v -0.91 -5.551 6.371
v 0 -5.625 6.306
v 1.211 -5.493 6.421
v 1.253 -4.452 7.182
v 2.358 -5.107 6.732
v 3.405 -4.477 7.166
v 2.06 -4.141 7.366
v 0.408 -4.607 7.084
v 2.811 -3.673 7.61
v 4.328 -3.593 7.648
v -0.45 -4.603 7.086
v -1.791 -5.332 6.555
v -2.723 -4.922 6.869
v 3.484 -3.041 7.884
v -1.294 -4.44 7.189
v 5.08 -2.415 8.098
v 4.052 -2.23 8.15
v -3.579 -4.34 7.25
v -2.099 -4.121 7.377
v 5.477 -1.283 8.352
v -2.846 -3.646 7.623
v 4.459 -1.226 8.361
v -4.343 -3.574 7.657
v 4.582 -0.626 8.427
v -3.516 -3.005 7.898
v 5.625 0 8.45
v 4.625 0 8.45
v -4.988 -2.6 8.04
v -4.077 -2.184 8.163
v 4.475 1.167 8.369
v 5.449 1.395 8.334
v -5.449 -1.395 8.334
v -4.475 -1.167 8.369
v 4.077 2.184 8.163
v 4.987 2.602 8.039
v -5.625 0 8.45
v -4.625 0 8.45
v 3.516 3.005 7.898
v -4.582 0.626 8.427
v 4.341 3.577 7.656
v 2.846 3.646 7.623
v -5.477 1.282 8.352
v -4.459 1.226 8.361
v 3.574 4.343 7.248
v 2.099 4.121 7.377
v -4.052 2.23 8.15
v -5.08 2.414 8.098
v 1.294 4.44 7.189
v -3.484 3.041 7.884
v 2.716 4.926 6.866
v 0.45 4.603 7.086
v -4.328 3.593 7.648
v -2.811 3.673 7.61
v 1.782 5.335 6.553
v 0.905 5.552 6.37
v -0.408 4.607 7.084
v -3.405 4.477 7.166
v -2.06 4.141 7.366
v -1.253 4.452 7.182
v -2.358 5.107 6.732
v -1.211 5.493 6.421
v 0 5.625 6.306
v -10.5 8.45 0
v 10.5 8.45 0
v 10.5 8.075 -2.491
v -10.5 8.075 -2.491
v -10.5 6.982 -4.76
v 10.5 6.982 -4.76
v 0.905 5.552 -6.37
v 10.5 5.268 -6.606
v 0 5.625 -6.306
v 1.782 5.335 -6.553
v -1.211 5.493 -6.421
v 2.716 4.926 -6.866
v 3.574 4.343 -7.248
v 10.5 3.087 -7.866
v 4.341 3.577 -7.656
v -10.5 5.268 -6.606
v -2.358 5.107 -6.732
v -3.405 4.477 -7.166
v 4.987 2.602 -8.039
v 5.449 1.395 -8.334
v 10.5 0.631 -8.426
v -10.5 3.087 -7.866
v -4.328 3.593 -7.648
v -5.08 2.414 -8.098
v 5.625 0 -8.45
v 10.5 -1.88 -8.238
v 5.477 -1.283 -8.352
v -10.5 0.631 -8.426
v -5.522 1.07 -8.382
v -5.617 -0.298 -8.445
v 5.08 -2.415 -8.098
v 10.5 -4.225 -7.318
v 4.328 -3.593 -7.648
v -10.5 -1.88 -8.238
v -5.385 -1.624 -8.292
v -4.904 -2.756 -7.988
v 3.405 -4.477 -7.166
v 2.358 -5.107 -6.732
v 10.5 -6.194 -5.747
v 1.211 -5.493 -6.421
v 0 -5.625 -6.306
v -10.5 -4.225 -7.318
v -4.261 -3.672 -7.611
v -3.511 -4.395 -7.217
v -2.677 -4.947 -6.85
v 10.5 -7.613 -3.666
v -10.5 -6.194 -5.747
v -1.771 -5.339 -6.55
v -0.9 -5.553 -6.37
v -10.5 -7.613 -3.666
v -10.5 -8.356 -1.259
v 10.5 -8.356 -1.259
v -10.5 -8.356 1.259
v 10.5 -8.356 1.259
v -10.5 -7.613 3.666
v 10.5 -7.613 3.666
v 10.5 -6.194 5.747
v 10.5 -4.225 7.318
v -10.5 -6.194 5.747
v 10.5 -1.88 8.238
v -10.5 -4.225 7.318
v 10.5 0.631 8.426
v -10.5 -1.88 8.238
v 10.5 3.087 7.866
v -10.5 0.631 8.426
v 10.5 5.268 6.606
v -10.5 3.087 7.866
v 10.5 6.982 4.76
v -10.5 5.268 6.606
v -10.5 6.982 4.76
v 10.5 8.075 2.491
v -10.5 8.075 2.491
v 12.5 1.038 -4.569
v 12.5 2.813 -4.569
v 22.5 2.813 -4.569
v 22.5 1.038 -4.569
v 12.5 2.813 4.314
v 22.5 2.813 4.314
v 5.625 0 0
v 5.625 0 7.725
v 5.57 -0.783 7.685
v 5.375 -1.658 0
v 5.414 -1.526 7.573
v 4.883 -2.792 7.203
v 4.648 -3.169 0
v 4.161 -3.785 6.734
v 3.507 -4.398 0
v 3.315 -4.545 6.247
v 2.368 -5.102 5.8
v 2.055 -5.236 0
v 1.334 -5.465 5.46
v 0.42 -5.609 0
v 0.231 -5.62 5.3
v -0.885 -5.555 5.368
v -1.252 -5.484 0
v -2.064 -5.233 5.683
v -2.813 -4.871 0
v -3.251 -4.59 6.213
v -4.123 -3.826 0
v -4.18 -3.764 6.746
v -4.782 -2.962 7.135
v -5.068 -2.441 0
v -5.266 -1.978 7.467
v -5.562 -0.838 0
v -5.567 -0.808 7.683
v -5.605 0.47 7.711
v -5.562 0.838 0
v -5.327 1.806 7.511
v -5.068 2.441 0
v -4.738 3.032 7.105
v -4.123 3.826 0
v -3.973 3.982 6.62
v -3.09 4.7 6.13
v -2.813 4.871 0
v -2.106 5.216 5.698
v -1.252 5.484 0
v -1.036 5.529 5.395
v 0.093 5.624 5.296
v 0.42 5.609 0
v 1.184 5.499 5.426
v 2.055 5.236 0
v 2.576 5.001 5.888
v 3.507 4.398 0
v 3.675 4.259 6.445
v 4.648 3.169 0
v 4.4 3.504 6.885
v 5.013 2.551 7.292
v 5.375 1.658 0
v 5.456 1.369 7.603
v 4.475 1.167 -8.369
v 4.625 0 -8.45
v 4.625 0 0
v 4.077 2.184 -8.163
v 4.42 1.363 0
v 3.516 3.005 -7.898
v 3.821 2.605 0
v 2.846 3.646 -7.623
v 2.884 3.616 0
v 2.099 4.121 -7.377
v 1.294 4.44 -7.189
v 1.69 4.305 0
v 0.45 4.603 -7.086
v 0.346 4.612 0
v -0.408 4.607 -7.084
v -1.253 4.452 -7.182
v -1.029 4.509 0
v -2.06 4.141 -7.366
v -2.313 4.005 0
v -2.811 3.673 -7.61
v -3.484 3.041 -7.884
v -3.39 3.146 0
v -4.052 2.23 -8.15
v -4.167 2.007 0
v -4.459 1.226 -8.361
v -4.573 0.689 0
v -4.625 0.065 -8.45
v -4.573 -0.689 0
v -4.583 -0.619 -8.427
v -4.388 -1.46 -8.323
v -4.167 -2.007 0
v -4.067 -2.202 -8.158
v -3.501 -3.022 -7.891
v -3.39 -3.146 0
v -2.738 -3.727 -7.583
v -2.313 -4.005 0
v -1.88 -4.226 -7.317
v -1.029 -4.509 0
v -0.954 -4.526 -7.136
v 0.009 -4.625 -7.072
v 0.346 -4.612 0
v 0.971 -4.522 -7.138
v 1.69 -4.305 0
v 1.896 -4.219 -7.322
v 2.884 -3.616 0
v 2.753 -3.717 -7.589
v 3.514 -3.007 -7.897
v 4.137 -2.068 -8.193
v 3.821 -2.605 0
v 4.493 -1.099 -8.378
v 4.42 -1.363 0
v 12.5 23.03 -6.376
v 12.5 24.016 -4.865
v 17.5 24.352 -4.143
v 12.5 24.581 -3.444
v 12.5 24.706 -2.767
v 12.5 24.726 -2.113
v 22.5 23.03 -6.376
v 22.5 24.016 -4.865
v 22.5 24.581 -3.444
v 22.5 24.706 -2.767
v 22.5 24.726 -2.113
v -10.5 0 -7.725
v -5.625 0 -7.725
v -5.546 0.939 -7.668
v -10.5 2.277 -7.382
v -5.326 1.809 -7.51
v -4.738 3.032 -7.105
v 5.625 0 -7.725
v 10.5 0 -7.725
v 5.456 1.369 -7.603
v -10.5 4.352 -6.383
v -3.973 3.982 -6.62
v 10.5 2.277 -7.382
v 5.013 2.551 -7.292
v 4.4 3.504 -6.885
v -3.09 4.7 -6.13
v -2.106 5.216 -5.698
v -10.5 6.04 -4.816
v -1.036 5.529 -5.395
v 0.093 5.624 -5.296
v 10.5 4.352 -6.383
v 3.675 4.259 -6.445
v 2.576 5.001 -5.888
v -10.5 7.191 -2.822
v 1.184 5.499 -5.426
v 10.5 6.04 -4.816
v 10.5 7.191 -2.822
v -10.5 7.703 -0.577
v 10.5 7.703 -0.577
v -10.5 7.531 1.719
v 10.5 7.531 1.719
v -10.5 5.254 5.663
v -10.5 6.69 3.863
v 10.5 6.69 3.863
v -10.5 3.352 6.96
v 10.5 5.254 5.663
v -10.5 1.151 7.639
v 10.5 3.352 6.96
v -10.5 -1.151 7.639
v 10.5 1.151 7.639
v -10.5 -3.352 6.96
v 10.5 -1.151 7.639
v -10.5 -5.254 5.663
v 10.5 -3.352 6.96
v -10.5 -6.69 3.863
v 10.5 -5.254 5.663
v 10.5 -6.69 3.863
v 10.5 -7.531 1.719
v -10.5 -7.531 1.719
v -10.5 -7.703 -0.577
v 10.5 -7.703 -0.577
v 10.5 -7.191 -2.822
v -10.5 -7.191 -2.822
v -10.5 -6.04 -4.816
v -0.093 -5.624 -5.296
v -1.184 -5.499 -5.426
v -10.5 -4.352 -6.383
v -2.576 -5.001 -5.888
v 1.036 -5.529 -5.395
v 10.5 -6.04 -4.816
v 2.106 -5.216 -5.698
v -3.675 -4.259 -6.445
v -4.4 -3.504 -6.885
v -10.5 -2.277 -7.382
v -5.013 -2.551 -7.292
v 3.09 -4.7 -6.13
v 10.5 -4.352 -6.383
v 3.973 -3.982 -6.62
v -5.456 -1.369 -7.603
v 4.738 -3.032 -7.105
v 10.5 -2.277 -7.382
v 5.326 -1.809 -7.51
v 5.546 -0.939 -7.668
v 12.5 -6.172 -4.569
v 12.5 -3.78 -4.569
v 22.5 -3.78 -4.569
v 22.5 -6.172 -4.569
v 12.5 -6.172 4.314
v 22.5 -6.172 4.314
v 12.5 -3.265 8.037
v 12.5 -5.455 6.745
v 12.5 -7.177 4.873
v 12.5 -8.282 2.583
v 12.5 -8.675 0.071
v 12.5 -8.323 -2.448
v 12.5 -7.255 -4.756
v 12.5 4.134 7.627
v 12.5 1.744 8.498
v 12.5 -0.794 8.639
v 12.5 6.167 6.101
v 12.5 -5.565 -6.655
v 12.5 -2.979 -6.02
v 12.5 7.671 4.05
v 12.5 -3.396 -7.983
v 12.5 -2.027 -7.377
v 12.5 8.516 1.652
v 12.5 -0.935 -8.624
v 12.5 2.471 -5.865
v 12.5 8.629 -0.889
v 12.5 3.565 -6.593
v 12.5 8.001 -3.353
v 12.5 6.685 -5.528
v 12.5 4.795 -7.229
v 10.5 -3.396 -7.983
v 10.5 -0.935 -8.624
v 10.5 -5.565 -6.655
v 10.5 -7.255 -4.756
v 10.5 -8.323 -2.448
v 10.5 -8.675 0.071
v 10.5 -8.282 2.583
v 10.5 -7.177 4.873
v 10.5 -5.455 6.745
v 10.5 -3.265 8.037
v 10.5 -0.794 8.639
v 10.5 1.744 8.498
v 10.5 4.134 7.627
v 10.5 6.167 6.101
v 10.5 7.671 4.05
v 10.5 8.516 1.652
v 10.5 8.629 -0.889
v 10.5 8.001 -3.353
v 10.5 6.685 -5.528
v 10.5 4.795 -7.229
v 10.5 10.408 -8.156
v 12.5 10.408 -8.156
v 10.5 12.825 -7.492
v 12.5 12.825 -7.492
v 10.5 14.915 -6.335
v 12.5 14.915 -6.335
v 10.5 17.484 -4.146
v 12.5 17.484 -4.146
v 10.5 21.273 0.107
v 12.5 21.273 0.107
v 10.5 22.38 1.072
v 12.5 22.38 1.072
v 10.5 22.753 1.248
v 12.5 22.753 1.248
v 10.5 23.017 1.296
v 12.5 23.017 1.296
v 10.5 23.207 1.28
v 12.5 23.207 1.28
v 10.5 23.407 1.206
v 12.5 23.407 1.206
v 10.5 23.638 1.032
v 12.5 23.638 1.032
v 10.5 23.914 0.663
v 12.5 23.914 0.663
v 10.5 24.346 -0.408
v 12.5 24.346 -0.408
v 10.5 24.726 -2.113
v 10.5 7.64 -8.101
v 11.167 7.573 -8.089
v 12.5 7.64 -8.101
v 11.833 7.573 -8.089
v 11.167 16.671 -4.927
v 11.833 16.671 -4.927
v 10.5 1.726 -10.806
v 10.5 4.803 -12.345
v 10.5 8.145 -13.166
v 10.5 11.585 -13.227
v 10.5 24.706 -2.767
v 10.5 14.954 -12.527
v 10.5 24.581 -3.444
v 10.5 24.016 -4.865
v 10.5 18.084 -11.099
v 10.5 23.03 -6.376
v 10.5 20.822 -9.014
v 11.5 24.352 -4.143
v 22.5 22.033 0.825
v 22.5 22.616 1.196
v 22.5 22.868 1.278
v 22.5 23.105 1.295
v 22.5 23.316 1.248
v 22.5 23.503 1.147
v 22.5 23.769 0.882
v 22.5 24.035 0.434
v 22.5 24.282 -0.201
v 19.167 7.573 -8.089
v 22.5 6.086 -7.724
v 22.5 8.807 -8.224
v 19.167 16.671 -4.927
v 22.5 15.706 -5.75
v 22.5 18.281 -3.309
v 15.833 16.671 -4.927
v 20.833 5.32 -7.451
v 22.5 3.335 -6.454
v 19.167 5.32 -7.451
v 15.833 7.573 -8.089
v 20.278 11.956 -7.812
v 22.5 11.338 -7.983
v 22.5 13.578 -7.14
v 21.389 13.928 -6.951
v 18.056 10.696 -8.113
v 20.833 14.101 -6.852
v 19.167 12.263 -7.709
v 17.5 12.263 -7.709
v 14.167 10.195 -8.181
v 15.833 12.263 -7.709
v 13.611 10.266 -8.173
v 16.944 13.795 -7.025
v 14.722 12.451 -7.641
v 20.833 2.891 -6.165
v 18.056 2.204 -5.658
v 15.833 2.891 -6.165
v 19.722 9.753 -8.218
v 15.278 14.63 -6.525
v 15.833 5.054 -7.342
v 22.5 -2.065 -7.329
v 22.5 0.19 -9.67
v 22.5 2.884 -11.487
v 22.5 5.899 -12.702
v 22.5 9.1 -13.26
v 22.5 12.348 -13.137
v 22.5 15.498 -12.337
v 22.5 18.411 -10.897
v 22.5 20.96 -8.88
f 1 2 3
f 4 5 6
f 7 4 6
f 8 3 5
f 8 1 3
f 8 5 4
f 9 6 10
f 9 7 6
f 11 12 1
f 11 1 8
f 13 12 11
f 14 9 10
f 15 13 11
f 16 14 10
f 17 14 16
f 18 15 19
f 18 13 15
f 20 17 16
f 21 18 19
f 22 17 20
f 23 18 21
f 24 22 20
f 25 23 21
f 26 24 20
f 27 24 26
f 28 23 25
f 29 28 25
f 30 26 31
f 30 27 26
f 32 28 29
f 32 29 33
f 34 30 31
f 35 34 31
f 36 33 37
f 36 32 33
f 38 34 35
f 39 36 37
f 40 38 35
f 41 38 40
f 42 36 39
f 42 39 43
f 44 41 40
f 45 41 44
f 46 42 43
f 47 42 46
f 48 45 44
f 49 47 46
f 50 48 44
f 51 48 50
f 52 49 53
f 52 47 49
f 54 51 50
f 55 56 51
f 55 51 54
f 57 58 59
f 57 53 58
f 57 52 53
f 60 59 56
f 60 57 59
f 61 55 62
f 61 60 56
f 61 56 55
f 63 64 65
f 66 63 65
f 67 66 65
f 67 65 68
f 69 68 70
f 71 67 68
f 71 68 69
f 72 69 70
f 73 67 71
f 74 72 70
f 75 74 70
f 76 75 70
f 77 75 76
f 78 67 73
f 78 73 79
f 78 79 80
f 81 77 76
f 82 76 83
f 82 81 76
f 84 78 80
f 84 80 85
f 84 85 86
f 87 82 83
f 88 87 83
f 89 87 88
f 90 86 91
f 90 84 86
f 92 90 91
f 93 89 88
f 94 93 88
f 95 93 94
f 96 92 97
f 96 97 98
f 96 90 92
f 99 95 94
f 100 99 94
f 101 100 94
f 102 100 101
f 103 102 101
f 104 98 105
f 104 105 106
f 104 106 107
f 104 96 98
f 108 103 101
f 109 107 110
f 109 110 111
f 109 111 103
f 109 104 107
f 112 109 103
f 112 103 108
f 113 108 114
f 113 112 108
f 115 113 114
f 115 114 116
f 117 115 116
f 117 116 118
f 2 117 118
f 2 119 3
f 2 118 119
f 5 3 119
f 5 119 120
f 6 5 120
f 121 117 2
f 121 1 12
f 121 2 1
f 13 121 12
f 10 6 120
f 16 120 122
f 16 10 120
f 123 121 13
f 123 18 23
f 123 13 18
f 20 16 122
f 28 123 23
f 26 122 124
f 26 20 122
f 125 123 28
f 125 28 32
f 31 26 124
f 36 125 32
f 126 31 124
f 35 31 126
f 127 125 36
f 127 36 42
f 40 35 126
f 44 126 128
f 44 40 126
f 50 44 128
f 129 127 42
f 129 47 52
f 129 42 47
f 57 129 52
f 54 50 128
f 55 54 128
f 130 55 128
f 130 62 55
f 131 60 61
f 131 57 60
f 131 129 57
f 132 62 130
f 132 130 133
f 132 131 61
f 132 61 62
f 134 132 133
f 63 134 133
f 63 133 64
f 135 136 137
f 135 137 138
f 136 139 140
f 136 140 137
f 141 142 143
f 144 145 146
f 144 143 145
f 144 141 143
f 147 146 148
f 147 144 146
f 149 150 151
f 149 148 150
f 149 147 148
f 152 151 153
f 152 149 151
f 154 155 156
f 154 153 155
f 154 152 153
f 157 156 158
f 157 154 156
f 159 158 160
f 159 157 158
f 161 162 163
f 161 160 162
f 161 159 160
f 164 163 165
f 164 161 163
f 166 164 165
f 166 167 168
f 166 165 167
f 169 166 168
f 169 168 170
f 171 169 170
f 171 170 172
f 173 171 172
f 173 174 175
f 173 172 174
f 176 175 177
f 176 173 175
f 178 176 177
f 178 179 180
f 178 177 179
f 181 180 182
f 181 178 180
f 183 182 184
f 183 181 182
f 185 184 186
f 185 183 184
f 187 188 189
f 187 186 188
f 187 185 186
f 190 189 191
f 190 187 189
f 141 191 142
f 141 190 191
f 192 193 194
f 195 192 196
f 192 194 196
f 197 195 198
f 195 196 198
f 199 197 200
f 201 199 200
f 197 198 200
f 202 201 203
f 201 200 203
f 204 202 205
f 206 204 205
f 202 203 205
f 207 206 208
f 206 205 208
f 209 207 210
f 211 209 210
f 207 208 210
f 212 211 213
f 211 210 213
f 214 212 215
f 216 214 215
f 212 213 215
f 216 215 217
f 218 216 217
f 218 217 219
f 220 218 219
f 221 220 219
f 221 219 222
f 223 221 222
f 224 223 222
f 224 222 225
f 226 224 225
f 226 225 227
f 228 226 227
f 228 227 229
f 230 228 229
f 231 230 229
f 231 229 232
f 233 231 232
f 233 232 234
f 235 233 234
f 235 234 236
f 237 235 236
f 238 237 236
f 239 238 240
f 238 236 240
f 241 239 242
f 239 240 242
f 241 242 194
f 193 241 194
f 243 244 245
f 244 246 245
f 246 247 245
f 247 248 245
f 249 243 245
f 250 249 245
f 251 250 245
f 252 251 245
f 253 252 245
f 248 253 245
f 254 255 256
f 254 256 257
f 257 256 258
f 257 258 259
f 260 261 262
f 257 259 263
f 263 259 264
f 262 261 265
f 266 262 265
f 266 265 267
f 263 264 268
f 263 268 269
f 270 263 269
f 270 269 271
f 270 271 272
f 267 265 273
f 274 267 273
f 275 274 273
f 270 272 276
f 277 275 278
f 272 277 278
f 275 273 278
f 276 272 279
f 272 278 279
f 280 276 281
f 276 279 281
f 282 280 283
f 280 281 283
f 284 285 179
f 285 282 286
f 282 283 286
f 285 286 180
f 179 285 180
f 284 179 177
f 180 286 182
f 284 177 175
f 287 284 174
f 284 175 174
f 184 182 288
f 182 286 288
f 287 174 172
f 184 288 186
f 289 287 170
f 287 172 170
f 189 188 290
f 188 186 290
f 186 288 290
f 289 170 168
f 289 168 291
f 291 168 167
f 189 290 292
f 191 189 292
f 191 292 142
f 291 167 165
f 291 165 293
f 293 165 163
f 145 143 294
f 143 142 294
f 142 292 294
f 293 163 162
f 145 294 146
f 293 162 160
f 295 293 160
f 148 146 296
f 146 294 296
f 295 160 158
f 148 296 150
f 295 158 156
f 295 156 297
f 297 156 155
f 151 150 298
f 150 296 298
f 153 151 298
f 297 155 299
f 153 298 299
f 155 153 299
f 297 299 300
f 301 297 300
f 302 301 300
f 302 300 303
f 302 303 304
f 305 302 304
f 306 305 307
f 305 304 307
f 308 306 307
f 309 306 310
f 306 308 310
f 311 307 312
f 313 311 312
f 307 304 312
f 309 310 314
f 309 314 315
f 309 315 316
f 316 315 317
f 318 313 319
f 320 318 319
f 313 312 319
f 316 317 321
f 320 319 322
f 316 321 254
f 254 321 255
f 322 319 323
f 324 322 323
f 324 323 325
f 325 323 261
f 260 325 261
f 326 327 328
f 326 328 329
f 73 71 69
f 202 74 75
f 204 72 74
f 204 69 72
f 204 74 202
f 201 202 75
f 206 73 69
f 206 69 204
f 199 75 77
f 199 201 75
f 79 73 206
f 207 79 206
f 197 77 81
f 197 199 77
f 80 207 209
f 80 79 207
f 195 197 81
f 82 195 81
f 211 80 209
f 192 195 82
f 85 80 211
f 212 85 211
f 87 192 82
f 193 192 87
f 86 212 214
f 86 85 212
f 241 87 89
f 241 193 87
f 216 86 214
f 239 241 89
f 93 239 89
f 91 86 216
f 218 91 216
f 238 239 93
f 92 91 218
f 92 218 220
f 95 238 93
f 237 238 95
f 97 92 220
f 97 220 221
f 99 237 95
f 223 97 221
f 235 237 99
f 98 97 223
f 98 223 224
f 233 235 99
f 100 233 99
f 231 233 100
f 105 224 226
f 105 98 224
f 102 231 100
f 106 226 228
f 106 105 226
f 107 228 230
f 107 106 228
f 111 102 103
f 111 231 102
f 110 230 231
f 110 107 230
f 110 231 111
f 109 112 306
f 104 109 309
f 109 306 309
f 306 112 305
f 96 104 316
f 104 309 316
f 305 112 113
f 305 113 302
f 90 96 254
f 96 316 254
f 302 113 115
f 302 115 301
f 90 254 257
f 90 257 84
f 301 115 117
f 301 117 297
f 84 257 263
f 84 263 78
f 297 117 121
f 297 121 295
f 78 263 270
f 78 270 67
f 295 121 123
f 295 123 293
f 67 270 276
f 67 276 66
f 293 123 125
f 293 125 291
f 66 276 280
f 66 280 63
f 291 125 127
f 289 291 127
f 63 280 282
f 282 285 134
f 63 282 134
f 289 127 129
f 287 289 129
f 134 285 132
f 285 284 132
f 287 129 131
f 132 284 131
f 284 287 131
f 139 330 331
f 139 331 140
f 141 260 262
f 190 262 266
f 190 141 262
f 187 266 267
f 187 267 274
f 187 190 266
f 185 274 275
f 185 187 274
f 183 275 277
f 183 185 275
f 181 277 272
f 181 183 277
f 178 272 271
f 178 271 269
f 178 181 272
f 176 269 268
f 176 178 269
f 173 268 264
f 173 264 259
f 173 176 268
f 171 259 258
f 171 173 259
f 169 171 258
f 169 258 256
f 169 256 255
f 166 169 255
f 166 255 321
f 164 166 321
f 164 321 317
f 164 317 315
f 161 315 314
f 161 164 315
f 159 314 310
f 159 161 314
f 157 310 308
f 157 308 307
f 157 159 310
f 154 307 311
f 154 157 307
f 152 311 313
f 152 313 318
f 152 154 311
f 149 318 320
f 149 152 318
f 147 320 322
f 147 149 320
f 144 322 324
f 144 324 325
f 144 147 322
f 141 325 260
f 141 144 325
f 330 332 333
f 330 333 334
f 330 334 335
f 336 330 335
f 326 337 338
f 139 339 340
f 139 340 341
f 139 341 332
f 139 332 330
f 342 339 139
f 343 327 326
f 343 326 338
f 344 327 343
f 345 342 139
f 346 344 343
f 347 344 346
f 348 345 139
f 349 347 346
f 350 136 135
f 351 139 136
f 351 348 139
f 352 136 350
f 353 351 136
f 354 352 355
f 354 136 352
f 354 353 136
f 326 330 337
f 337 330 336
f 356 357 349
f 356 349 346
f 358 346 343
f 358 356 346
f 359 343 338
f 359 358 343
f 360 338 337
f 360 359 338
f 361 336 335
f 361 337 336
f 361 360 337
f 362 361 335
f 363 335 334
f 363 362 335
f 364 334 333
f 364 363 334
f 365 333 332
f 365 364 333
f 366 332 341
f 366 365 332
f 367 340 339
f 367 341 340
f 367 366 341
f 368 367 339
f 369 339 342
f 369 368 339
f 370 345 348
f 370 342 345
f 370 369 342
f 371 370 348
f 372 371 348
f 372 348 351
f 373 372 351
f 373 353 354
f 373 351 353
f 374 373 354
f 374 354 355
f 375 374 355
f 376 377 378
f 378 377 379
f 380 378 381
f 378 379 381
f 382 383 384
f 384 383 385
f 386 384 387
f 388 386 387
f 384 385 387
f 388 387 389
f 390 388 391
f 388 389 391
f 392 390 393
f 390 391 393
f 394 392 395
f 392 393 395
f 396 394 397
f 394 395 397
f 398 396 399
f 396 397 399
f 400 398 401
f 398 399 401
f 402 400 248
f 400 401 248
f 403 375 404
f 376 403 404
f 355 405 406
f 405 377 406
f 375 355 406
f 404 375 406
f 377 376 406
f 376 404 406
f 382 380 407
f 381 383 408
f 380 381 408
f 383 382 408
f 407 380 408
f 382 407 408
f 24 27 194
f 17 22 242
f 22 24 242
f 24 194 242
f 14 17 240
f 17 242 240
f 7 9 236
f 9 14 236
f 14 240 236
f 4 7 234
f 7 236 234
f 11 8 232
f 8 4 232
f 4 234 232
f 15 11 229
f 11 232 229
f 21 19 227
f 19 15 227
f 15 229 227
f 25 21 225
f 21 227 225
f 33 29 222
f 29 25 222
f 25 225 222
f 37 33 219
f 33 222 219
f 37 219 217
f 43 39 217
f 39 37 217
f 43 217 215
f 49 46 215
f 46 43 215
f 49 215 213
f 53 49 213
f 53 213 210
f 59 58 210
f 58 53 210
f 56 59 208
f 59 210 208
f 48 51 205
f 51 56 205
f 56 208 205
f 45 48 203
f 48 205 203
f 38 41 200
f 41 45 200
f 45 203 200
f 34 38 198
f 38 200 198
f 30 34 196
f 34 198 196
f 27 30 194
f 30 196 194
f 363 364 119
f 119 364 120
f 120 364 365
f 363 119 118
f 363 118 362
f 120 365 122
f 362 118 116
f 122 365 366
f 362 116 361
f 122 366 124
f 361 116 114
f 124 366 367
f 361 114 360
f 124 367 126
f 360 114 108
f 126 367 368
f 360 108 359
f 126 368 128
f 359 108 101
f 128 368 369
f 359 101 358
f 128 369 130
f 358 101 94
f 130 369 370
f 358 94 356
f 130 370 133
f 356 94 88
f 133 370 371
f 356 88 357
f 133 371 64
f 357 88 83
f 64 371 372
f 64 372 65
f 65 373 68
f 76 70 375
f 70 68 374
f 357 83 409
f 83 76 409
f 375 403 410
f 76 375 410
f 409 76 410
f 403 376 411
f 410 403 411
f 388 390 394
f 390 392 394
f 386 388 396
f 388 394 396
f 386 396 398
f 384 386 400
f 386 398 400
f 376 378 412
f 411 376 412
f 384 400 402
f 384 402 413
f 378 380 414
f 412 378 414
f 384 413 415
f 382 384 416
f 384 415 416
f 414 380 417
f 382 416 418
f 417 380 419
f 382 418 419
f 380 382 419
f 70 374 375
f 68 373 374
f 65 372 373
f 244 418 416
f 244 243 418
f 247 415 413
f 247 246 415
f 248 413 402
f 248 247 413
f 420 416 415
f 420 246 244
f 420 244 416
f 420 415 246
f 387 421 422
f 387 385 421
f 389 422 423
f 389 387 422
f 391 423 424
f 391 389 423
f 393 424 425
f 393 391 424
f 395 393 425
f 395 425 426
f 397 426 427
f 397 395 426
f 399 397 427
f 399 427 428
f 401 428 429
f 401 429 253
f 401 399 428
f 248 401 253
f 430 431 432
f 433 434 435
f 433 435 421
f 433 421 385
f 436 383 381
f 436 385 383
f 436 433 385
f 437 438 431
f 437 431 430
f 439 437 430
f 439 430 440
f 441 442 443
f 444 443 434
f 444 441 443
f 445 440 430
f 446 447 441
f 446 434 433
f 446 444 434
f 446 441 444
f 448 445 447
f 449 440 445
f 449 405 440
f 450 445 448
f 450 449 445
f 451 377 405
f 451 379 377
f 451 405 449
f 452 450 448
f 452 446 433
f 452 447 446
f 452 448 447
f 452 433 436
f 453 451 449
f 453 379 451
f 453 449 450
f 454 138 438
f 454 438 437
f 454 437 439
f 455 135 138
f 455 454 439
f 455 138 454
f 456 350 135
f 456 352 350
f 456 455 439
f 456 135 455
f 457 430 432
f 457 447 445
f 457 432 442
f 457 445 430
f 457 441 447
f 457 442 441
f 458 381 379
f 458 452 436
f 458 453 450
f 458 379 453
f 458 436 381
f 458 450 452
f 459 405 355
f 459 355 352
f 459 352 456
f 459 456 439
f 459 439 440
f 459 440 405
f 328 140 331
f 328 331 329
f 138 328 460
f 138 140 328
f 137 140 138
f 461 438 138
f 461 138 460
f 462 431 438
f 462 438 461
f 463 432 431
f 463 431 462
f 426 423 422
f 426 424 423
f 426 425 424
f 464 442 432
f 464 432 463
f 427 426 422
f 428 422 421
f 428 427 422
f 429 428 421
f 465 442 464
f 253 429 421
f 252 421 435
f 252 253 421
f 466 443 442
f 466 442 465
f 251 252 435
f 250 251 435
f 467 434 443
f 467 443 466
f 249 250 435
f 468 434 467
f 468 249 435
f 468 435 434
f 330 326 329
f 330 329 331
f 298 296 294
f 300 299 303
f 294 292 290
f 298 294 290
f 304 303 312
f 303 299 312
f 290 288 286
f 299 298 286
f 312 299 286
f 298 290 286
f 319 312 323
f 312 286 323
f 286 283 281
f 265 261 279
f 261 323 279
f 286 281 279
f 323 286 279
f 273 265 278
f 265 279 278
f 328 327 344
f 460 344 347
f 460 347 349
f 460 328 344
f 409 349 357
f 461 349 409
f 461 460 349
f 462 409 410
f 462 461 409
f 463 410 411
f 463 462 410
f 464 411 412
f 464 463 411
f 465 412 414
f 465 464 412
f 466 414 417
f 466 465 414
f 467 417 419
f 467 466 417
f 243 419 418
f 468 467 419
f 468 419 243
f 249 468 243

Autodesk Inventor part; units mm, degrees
ref_plane "YZ Plane" through (0, 0, 0) normal (1, 0, 0) x (0, 1, 0)
ref_plane "XZ Plane" through (0, 0, 0) normal (0, 1, 0) x (-1, 0, 0)
ref_plane "XY Plane" through (0, 0, 0) normal (0, 0, 1) x (1, 0, 0)
sketch "Sketch1" plane through (0, 0, 0) normal (1, 0, 0) x (0, 1, 0)
  circle A0 centre (0, 0) radius 8.45
  dimension "d0" = 16.9
extrude "Extrusion1" add sketch "Sketch1" along normal mid plane 21
sketch "Sketch2" plane through (10.5, 0, 0) normal (1, 0, 0) x (0, 0, -1)
  circle A0 centre (0, 0) radius 7.725
  circle A1 centre (0, 0) radius 9.725
  dimension "d3" = 2
  dimension "d4" = 19.45
extrude "Extrusion2" cut sketch "Sketch2" against normal blind 21.5 contours A0
sketch "Sketch3" plane through (0, 0, 0) normal (0, 0, 1) x (1, 0, 0)
  circle A0 centre (0, 0) radius 5.625
  dimension "d7" = 11.25
extrude "Extrusion3" add sketch "Sketch3" along normal mid plane 18
sketch "Sketch4" plane through (0, 0, 0) normal (0, 0, 1) x (1, 0, 0)
  circle A0 centre (0, 0) radius 4.625
  dimension "d10" = 9.25
extrude "Extrusion5" cut sketch "Sketch4" along normal mid plane 100
sketch "Sketch5" plane through (10.5, 0, 0) normal (1, 0, 0) x (0, 0, -1)
  circle A0 centre (0, 0) radius 8.675
  dimension "d15" = 17.35
extrude "Extrusion6" add sketch "Sketch5" along normal blind 2
sketch "Sketch6" plane through (12.5, 0, 0) normal (1, 0, 0) x (0, 0, -1)
  arc A0 (1.0628, -4.9847) -> (6.3756, 23.0304) centre (-2.1717, 10.14) ccw
  spline S0 degree 4 poles (1.0628, -0.783) (3.325, -0.3237) (6.6509, 1.9196) (12.5543, 12.8577) (0.0955, 21.0445) (-3.8878, 23.6903) (2.1134, 24.7257) knots 0 0 0 0 0 0.38125 0.63125 1 1 1 1 1
  line L0 (-1.8785, -1.3802) -> (4.0041, -0.1858) construction
  arc A1 (-1.2523, -0.8951) -> (3.2382, 0.0167) centre (-0.4606, 6.7196) ccw construction
  spline S1 degree 2 poles (6.3756, 23.0304) (3.3857, 25.3291) (1.0628, 24.5204) knots 0 0 0 1 1 1
  line L1 (-6.8176, 23.1848) -> (11.0445, 26.2665) construction
  arc A2 (9.1477, 24.9445) -> (-4.5875, 22.5748) centre (6.4085, -0.169) ccw construction
  line L2 (-4.3138, 2.8134) -> (4.5692, 2.8134)
  line L3 (4.5692, -6.1723) -> (-4.3138, -6.1723)
  line L4 (-4.3138, -6.1723) -> (-4.3138, 2.8134)
  line L5 (4.5692, 2.8134) -> (4.5692, 1.038)
  line L6 (4.5692, -3.7804) -> (4.5692, -6.1723)
  point P0 (0, 0)
  point P1 (-0.6365, 21.8121)
  point P2 (1.0628, -0.783)
  point P3 (3.2364, 24.6304)
  point P4 (2.1134, 24.7257)
  point P5 (2.1133, 24.7254)
  point P6 (1.0633, 24.5166)
extrude "Extrusion7" add sketch "Sketch6" along normal blind 10 and the other way blind 2
sketch "Sketch7" plane through (-10.5, 0, 0) normal (-1, 0, 0) x (0, 0, 1)
  circle A0 centre (0, 0) radius 8.45
  circle A1 centre (0, 0) radius 11.1999
  dimension "d23" = 16.9
extrude "Extrusion8" cut sketch "Sketch7" against normal blind 17.75
